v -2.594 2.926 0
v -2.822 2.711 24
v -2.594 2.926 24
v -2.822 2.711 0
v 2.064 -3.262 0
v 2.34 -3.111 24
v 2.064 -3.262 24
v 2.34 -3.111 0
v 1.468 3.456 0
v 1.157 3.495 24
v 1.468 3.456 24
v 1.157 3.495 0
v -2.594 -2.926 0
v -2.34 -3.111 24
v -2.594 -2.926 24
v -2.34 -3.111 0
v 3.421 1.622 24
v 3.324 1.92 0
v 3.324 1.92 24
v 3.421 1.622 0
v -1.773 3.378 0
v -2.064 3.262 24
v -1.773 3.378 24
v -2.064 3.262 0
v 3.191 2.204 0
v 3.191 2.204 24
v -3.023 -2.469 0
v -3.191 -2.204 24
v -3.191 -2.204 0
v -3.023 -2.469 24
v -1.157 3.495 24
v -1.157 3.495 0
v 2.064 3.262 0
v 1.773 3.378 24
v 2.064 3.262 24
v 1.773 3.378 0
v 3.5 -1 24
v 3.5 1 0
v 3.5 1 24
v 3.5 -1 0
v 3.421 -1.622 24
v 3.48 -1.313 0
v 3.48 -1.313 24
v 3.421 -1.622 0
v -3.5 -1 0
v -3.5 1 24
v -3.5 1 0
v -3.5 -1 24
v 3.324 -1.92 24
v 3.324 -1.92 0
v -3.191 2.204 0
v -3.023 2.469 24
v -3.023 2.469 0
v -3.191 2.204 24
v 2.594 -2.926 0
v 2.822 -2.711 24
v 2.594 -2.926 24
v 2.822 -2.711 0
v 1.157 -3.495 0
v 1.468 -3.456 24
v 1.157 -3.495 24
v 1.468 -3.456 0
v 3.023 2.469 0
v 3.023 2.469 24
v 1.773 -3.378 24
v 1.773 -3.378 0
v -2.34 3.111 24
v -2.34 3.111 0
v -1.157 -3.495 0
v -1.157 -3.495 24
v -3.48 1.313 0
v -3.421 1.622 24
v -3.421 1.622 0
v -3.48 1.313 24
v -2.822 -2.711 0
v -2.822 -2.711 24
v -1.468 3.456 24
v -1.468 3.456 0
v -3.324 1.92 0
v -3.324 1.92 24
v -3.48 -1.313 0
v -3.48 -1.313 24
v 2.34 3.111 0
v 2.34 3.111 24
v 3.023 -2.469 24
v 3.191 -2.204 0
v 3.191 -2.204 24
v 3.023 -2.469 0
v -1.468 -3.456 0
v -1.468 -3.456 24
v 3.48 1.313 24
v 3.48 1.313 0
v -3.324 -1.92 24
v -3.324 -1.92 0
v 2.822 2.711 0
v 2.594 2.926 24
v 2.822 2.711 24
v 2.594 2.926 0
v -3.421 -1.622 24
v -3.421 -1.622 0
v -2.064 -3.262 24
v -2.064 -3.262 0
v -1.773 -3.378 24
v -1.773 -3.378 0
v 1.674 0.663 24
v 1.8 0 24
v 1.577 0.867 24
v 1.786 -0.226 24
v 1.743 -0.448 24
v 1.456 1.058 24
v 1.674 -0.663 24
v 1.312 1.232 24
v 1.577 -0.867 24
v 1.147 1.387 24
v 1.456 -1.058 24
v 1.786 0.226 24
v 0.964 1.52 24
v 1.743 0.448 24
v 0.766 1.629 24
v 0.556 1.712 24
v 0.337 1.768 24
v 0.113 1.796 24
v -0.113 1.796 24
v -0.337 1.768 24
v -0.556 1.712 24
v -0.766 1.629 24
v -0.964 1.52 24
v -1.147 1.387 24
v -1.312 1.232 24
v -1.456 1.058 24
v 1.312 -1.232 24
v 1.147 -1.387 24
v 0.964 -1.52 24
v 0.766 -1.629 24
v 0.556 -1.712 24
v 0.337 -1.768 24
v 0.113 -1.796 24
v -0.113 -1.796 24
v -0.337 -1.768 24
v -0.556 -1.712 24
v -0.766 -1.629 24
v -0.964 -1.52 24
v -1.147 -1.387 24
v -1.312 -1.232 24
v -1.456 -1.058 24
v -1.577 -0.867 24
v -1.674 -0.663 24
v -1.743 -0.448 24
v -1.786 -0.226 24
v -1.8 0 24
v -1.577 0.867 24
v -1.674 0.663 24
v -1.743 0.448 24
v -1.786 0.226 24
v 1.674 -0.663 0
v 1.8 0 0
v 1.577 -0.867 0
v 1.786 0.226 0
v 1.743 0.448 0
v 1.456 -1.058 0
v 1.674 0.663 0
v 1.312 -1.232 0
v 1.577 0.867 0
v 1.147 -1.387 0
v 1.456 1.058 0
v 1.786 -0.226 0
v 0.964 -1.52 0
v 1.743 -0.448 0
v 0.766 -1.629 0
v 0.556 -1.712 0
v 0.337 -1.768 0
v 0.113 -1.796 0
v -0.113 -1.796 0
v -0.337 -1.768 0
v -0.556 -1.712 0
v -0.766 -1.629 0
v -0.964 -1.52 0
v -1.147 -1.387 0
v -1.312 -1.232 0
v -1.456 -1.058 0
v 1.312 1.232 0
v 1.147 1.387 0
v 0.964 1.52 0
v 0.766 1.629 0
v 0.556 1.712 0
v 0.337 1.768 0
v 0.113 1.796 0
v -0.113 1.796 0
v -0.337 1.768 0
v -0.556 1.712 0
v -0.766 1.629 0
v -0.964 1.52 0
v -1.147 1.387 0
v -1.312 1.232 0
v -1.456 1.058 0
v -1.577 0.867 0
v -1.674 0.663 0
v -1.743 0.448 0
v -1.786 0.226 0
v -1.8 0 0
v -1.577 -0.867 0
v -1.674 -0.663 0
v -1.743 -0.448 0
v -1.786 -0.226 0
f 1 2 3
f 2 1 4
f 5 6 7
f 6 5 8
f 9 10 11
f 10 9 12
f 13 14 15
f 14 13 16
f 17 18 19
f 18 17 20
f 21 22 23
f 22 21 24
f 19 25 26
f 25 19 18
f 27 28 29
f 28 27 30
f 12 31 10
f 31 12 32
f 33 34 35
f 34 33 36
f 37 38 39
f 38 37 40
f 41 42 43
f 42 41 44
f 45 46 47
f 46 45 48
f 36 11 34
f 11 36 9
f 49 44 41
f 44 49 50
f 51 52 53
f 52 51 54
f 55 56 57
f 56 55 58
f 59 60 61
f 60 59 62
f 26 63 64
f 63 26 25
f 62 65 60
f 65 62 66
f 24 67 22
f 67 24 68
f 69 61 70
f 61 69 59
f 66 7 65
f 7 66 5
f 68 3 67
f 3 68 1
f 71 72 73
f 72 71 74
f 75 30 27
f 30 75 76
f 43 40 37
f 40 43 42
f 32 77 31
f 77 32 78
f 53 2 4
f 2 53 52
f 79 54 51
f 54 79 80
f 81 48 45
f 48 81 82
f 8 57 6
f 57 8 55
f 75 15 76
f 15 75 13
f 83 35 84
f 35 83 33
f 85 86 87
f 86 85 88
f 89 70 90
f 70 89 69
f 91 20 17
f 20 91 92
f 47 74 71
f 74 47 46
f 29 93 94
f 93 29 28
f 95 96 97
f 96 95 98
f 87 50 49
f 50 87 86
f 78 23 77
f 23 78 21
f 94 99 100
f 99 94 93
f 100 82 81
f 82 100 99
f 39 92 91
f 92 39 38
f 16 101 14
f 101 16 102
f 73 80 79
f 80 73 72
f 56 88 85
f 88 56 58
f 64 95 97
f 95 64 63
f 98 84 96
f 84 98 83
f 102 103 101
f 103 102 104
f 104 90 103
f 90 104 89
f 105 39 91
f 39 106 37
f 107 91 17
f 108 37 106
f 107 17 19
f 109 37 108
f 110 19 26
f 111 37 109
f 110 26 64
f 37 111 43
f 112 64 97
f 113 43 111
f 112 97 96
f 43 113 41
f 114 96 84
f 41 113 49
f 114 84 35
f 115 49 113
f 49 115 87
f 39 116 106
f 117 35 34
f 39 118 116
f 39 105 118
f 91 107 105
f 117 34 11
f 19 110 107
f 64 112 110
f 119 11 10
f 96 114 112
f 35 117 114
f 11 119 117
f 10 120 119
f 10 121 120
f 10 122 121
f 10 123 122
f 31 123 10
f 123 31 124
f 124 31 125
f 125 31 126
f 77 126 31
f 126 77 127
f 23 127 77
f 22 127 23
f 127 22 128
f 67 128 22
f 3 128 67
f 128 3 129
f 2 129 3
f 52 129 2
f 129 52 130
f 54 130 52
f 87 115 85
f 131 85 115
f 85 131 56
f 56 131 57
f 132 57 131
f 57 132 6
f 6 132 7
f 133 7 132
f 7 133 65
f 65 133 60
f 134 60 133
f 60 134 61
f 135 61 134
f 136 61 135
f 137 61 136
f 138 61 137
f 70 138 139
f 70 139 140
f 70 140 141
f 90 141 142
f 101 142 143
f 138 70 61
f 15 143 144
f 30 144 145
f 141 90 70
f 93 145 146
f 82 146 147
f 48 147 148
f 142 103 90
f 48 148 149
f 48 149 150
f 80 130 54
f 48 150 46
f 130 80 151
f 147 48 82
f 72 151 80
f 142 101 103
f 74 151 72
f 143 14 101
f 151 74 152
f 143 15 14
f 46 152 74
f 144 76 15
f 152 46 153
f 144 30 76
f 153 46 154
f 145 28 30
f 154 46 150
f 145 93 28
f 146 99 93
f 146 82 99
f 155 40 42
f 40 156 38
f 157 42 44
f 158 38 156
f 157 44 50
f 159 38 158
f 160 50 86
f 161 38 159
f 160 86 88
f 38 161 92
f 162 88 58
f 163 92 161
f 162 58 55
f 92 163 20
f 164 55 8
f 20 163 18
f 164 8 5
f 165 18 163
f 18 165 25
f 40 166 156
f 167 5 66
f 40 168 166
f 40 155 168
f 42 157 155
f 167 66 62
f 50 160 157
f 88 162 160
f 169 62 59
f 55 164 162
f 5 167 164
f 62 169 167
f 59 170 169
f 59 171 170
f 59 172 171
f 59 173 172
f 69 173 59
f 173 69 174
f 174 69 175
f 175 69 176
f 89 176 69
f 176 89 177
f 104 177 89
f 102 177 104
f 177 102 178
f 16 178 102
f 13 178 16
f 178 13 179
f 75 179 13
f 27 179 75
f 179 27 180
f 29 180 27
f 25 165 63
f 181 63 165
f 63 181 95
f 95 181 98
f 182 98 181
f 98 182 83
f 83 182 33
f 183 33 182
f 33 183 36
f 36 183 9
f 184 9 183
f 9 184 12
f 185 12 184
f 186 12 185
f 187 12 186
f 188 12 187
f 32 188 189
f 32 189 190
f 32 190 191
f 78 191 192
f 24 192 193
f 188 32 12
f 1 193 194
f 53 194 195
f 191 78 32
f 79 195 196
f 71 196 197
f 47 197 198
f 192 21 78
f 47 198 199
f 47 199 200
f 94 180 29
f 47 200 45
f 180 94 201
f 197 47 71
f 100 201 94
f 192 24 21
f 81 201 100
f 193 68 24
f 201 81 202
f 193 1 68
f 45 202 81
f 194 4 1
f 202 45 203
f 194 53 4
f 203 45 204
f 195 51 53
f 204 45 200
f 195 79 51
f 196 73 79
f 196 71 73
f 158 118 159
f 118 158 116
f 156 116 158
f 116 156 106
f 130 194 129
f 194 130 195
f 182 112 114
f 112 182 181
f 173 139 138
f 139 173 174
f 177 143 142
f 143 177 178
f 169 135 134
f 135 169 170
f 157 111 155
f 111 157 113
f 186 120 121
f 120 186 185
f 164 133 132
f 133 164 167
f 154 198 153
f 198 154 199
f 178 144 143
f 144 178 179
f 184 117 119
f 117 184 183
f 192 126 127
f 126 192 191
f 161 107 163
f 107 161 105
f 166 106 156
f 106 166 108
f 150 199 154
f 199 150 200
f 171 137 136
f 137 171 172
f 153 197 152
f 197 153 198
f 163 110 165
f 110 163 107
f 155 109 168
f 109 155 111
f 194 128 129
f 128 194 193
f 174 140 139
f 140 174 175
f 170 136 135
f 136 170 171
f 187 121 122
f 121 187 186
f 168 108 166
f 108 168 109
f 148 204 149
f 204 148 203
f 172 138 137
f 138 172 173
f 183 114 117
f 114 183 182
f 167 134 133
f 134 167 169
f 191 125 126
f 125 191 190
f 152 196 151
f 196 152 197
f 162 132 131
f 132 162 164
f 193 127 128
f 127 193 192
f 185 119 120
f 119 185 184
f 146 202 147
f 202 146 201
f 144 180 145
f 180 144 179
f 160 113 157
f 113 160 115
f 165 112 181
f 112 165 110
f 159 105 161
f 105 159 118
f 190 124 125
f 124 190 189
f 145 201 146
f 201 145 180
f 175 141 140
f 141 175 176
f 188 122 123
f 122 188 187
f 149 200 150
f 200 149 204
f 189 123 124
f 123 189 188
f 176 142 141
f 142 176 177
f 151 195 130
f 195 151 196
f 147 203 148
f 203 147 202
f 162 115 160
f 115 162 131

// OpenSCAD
$fn = 50;


difference() {
	union() {
		translate(v = [0, 0, 0]) {
			rotate(a = [0, 0, 0]) {
				hull() {
					translate(v = [-1.0000000000, 1.0000000000, 0]) {
						rotate(a = [0, 0, 0]) {
							translate(v = [0, 0, 0]) {
								rotate(a = [0, 0, 0]) {
									cylinder(h = 24, r = 2.5000000000);
								}
							}
						}
					}
					translate(v = [1.0000000000, 1.0000000000, 0]) {
						rotate(a = [0, 0, 0]) {
							translate(v = [0, 0, 0]) {
								rotate(a = [0, 0, 0]) {
									cylinder(h = 24, r = 2.5000000000);
								}
							}
						}
					}
					translate(v = [-1.0000000000, -1.0000000000, 0]) {
						rotate(a = [0, 0, 0]) {
							translate(v = [0, 0, 0]) {
								rotate(a = [0, 0, 0]) {
									cylinder(h = 24, r = 2.5000000000);
								}
							}
						}
					}
					translate(v = [1.0000000000, -1.0000000000, 0]) {
						rotate(a = [0, 0, 0]) {
							translate(v = [0, 0, 0]) {
								rotate(a = [0, 0, 0]) {
									cylinder(h = 24, r = 2.5000000000);
								}
							}
						}
					}
				}
			}
		}
	}
	union() {
		translate(v = [0.0000000000, 0.0000000000, 0]) {
			rotate(a = [0, 0, 0]) {
				translate(v = [0, 0, -50]) {
					rotate(a = [0, 0, 0]) {
						cylinder(h = 100, r = 1.8000000000);
					}
				}
			}
		}
	}
}
